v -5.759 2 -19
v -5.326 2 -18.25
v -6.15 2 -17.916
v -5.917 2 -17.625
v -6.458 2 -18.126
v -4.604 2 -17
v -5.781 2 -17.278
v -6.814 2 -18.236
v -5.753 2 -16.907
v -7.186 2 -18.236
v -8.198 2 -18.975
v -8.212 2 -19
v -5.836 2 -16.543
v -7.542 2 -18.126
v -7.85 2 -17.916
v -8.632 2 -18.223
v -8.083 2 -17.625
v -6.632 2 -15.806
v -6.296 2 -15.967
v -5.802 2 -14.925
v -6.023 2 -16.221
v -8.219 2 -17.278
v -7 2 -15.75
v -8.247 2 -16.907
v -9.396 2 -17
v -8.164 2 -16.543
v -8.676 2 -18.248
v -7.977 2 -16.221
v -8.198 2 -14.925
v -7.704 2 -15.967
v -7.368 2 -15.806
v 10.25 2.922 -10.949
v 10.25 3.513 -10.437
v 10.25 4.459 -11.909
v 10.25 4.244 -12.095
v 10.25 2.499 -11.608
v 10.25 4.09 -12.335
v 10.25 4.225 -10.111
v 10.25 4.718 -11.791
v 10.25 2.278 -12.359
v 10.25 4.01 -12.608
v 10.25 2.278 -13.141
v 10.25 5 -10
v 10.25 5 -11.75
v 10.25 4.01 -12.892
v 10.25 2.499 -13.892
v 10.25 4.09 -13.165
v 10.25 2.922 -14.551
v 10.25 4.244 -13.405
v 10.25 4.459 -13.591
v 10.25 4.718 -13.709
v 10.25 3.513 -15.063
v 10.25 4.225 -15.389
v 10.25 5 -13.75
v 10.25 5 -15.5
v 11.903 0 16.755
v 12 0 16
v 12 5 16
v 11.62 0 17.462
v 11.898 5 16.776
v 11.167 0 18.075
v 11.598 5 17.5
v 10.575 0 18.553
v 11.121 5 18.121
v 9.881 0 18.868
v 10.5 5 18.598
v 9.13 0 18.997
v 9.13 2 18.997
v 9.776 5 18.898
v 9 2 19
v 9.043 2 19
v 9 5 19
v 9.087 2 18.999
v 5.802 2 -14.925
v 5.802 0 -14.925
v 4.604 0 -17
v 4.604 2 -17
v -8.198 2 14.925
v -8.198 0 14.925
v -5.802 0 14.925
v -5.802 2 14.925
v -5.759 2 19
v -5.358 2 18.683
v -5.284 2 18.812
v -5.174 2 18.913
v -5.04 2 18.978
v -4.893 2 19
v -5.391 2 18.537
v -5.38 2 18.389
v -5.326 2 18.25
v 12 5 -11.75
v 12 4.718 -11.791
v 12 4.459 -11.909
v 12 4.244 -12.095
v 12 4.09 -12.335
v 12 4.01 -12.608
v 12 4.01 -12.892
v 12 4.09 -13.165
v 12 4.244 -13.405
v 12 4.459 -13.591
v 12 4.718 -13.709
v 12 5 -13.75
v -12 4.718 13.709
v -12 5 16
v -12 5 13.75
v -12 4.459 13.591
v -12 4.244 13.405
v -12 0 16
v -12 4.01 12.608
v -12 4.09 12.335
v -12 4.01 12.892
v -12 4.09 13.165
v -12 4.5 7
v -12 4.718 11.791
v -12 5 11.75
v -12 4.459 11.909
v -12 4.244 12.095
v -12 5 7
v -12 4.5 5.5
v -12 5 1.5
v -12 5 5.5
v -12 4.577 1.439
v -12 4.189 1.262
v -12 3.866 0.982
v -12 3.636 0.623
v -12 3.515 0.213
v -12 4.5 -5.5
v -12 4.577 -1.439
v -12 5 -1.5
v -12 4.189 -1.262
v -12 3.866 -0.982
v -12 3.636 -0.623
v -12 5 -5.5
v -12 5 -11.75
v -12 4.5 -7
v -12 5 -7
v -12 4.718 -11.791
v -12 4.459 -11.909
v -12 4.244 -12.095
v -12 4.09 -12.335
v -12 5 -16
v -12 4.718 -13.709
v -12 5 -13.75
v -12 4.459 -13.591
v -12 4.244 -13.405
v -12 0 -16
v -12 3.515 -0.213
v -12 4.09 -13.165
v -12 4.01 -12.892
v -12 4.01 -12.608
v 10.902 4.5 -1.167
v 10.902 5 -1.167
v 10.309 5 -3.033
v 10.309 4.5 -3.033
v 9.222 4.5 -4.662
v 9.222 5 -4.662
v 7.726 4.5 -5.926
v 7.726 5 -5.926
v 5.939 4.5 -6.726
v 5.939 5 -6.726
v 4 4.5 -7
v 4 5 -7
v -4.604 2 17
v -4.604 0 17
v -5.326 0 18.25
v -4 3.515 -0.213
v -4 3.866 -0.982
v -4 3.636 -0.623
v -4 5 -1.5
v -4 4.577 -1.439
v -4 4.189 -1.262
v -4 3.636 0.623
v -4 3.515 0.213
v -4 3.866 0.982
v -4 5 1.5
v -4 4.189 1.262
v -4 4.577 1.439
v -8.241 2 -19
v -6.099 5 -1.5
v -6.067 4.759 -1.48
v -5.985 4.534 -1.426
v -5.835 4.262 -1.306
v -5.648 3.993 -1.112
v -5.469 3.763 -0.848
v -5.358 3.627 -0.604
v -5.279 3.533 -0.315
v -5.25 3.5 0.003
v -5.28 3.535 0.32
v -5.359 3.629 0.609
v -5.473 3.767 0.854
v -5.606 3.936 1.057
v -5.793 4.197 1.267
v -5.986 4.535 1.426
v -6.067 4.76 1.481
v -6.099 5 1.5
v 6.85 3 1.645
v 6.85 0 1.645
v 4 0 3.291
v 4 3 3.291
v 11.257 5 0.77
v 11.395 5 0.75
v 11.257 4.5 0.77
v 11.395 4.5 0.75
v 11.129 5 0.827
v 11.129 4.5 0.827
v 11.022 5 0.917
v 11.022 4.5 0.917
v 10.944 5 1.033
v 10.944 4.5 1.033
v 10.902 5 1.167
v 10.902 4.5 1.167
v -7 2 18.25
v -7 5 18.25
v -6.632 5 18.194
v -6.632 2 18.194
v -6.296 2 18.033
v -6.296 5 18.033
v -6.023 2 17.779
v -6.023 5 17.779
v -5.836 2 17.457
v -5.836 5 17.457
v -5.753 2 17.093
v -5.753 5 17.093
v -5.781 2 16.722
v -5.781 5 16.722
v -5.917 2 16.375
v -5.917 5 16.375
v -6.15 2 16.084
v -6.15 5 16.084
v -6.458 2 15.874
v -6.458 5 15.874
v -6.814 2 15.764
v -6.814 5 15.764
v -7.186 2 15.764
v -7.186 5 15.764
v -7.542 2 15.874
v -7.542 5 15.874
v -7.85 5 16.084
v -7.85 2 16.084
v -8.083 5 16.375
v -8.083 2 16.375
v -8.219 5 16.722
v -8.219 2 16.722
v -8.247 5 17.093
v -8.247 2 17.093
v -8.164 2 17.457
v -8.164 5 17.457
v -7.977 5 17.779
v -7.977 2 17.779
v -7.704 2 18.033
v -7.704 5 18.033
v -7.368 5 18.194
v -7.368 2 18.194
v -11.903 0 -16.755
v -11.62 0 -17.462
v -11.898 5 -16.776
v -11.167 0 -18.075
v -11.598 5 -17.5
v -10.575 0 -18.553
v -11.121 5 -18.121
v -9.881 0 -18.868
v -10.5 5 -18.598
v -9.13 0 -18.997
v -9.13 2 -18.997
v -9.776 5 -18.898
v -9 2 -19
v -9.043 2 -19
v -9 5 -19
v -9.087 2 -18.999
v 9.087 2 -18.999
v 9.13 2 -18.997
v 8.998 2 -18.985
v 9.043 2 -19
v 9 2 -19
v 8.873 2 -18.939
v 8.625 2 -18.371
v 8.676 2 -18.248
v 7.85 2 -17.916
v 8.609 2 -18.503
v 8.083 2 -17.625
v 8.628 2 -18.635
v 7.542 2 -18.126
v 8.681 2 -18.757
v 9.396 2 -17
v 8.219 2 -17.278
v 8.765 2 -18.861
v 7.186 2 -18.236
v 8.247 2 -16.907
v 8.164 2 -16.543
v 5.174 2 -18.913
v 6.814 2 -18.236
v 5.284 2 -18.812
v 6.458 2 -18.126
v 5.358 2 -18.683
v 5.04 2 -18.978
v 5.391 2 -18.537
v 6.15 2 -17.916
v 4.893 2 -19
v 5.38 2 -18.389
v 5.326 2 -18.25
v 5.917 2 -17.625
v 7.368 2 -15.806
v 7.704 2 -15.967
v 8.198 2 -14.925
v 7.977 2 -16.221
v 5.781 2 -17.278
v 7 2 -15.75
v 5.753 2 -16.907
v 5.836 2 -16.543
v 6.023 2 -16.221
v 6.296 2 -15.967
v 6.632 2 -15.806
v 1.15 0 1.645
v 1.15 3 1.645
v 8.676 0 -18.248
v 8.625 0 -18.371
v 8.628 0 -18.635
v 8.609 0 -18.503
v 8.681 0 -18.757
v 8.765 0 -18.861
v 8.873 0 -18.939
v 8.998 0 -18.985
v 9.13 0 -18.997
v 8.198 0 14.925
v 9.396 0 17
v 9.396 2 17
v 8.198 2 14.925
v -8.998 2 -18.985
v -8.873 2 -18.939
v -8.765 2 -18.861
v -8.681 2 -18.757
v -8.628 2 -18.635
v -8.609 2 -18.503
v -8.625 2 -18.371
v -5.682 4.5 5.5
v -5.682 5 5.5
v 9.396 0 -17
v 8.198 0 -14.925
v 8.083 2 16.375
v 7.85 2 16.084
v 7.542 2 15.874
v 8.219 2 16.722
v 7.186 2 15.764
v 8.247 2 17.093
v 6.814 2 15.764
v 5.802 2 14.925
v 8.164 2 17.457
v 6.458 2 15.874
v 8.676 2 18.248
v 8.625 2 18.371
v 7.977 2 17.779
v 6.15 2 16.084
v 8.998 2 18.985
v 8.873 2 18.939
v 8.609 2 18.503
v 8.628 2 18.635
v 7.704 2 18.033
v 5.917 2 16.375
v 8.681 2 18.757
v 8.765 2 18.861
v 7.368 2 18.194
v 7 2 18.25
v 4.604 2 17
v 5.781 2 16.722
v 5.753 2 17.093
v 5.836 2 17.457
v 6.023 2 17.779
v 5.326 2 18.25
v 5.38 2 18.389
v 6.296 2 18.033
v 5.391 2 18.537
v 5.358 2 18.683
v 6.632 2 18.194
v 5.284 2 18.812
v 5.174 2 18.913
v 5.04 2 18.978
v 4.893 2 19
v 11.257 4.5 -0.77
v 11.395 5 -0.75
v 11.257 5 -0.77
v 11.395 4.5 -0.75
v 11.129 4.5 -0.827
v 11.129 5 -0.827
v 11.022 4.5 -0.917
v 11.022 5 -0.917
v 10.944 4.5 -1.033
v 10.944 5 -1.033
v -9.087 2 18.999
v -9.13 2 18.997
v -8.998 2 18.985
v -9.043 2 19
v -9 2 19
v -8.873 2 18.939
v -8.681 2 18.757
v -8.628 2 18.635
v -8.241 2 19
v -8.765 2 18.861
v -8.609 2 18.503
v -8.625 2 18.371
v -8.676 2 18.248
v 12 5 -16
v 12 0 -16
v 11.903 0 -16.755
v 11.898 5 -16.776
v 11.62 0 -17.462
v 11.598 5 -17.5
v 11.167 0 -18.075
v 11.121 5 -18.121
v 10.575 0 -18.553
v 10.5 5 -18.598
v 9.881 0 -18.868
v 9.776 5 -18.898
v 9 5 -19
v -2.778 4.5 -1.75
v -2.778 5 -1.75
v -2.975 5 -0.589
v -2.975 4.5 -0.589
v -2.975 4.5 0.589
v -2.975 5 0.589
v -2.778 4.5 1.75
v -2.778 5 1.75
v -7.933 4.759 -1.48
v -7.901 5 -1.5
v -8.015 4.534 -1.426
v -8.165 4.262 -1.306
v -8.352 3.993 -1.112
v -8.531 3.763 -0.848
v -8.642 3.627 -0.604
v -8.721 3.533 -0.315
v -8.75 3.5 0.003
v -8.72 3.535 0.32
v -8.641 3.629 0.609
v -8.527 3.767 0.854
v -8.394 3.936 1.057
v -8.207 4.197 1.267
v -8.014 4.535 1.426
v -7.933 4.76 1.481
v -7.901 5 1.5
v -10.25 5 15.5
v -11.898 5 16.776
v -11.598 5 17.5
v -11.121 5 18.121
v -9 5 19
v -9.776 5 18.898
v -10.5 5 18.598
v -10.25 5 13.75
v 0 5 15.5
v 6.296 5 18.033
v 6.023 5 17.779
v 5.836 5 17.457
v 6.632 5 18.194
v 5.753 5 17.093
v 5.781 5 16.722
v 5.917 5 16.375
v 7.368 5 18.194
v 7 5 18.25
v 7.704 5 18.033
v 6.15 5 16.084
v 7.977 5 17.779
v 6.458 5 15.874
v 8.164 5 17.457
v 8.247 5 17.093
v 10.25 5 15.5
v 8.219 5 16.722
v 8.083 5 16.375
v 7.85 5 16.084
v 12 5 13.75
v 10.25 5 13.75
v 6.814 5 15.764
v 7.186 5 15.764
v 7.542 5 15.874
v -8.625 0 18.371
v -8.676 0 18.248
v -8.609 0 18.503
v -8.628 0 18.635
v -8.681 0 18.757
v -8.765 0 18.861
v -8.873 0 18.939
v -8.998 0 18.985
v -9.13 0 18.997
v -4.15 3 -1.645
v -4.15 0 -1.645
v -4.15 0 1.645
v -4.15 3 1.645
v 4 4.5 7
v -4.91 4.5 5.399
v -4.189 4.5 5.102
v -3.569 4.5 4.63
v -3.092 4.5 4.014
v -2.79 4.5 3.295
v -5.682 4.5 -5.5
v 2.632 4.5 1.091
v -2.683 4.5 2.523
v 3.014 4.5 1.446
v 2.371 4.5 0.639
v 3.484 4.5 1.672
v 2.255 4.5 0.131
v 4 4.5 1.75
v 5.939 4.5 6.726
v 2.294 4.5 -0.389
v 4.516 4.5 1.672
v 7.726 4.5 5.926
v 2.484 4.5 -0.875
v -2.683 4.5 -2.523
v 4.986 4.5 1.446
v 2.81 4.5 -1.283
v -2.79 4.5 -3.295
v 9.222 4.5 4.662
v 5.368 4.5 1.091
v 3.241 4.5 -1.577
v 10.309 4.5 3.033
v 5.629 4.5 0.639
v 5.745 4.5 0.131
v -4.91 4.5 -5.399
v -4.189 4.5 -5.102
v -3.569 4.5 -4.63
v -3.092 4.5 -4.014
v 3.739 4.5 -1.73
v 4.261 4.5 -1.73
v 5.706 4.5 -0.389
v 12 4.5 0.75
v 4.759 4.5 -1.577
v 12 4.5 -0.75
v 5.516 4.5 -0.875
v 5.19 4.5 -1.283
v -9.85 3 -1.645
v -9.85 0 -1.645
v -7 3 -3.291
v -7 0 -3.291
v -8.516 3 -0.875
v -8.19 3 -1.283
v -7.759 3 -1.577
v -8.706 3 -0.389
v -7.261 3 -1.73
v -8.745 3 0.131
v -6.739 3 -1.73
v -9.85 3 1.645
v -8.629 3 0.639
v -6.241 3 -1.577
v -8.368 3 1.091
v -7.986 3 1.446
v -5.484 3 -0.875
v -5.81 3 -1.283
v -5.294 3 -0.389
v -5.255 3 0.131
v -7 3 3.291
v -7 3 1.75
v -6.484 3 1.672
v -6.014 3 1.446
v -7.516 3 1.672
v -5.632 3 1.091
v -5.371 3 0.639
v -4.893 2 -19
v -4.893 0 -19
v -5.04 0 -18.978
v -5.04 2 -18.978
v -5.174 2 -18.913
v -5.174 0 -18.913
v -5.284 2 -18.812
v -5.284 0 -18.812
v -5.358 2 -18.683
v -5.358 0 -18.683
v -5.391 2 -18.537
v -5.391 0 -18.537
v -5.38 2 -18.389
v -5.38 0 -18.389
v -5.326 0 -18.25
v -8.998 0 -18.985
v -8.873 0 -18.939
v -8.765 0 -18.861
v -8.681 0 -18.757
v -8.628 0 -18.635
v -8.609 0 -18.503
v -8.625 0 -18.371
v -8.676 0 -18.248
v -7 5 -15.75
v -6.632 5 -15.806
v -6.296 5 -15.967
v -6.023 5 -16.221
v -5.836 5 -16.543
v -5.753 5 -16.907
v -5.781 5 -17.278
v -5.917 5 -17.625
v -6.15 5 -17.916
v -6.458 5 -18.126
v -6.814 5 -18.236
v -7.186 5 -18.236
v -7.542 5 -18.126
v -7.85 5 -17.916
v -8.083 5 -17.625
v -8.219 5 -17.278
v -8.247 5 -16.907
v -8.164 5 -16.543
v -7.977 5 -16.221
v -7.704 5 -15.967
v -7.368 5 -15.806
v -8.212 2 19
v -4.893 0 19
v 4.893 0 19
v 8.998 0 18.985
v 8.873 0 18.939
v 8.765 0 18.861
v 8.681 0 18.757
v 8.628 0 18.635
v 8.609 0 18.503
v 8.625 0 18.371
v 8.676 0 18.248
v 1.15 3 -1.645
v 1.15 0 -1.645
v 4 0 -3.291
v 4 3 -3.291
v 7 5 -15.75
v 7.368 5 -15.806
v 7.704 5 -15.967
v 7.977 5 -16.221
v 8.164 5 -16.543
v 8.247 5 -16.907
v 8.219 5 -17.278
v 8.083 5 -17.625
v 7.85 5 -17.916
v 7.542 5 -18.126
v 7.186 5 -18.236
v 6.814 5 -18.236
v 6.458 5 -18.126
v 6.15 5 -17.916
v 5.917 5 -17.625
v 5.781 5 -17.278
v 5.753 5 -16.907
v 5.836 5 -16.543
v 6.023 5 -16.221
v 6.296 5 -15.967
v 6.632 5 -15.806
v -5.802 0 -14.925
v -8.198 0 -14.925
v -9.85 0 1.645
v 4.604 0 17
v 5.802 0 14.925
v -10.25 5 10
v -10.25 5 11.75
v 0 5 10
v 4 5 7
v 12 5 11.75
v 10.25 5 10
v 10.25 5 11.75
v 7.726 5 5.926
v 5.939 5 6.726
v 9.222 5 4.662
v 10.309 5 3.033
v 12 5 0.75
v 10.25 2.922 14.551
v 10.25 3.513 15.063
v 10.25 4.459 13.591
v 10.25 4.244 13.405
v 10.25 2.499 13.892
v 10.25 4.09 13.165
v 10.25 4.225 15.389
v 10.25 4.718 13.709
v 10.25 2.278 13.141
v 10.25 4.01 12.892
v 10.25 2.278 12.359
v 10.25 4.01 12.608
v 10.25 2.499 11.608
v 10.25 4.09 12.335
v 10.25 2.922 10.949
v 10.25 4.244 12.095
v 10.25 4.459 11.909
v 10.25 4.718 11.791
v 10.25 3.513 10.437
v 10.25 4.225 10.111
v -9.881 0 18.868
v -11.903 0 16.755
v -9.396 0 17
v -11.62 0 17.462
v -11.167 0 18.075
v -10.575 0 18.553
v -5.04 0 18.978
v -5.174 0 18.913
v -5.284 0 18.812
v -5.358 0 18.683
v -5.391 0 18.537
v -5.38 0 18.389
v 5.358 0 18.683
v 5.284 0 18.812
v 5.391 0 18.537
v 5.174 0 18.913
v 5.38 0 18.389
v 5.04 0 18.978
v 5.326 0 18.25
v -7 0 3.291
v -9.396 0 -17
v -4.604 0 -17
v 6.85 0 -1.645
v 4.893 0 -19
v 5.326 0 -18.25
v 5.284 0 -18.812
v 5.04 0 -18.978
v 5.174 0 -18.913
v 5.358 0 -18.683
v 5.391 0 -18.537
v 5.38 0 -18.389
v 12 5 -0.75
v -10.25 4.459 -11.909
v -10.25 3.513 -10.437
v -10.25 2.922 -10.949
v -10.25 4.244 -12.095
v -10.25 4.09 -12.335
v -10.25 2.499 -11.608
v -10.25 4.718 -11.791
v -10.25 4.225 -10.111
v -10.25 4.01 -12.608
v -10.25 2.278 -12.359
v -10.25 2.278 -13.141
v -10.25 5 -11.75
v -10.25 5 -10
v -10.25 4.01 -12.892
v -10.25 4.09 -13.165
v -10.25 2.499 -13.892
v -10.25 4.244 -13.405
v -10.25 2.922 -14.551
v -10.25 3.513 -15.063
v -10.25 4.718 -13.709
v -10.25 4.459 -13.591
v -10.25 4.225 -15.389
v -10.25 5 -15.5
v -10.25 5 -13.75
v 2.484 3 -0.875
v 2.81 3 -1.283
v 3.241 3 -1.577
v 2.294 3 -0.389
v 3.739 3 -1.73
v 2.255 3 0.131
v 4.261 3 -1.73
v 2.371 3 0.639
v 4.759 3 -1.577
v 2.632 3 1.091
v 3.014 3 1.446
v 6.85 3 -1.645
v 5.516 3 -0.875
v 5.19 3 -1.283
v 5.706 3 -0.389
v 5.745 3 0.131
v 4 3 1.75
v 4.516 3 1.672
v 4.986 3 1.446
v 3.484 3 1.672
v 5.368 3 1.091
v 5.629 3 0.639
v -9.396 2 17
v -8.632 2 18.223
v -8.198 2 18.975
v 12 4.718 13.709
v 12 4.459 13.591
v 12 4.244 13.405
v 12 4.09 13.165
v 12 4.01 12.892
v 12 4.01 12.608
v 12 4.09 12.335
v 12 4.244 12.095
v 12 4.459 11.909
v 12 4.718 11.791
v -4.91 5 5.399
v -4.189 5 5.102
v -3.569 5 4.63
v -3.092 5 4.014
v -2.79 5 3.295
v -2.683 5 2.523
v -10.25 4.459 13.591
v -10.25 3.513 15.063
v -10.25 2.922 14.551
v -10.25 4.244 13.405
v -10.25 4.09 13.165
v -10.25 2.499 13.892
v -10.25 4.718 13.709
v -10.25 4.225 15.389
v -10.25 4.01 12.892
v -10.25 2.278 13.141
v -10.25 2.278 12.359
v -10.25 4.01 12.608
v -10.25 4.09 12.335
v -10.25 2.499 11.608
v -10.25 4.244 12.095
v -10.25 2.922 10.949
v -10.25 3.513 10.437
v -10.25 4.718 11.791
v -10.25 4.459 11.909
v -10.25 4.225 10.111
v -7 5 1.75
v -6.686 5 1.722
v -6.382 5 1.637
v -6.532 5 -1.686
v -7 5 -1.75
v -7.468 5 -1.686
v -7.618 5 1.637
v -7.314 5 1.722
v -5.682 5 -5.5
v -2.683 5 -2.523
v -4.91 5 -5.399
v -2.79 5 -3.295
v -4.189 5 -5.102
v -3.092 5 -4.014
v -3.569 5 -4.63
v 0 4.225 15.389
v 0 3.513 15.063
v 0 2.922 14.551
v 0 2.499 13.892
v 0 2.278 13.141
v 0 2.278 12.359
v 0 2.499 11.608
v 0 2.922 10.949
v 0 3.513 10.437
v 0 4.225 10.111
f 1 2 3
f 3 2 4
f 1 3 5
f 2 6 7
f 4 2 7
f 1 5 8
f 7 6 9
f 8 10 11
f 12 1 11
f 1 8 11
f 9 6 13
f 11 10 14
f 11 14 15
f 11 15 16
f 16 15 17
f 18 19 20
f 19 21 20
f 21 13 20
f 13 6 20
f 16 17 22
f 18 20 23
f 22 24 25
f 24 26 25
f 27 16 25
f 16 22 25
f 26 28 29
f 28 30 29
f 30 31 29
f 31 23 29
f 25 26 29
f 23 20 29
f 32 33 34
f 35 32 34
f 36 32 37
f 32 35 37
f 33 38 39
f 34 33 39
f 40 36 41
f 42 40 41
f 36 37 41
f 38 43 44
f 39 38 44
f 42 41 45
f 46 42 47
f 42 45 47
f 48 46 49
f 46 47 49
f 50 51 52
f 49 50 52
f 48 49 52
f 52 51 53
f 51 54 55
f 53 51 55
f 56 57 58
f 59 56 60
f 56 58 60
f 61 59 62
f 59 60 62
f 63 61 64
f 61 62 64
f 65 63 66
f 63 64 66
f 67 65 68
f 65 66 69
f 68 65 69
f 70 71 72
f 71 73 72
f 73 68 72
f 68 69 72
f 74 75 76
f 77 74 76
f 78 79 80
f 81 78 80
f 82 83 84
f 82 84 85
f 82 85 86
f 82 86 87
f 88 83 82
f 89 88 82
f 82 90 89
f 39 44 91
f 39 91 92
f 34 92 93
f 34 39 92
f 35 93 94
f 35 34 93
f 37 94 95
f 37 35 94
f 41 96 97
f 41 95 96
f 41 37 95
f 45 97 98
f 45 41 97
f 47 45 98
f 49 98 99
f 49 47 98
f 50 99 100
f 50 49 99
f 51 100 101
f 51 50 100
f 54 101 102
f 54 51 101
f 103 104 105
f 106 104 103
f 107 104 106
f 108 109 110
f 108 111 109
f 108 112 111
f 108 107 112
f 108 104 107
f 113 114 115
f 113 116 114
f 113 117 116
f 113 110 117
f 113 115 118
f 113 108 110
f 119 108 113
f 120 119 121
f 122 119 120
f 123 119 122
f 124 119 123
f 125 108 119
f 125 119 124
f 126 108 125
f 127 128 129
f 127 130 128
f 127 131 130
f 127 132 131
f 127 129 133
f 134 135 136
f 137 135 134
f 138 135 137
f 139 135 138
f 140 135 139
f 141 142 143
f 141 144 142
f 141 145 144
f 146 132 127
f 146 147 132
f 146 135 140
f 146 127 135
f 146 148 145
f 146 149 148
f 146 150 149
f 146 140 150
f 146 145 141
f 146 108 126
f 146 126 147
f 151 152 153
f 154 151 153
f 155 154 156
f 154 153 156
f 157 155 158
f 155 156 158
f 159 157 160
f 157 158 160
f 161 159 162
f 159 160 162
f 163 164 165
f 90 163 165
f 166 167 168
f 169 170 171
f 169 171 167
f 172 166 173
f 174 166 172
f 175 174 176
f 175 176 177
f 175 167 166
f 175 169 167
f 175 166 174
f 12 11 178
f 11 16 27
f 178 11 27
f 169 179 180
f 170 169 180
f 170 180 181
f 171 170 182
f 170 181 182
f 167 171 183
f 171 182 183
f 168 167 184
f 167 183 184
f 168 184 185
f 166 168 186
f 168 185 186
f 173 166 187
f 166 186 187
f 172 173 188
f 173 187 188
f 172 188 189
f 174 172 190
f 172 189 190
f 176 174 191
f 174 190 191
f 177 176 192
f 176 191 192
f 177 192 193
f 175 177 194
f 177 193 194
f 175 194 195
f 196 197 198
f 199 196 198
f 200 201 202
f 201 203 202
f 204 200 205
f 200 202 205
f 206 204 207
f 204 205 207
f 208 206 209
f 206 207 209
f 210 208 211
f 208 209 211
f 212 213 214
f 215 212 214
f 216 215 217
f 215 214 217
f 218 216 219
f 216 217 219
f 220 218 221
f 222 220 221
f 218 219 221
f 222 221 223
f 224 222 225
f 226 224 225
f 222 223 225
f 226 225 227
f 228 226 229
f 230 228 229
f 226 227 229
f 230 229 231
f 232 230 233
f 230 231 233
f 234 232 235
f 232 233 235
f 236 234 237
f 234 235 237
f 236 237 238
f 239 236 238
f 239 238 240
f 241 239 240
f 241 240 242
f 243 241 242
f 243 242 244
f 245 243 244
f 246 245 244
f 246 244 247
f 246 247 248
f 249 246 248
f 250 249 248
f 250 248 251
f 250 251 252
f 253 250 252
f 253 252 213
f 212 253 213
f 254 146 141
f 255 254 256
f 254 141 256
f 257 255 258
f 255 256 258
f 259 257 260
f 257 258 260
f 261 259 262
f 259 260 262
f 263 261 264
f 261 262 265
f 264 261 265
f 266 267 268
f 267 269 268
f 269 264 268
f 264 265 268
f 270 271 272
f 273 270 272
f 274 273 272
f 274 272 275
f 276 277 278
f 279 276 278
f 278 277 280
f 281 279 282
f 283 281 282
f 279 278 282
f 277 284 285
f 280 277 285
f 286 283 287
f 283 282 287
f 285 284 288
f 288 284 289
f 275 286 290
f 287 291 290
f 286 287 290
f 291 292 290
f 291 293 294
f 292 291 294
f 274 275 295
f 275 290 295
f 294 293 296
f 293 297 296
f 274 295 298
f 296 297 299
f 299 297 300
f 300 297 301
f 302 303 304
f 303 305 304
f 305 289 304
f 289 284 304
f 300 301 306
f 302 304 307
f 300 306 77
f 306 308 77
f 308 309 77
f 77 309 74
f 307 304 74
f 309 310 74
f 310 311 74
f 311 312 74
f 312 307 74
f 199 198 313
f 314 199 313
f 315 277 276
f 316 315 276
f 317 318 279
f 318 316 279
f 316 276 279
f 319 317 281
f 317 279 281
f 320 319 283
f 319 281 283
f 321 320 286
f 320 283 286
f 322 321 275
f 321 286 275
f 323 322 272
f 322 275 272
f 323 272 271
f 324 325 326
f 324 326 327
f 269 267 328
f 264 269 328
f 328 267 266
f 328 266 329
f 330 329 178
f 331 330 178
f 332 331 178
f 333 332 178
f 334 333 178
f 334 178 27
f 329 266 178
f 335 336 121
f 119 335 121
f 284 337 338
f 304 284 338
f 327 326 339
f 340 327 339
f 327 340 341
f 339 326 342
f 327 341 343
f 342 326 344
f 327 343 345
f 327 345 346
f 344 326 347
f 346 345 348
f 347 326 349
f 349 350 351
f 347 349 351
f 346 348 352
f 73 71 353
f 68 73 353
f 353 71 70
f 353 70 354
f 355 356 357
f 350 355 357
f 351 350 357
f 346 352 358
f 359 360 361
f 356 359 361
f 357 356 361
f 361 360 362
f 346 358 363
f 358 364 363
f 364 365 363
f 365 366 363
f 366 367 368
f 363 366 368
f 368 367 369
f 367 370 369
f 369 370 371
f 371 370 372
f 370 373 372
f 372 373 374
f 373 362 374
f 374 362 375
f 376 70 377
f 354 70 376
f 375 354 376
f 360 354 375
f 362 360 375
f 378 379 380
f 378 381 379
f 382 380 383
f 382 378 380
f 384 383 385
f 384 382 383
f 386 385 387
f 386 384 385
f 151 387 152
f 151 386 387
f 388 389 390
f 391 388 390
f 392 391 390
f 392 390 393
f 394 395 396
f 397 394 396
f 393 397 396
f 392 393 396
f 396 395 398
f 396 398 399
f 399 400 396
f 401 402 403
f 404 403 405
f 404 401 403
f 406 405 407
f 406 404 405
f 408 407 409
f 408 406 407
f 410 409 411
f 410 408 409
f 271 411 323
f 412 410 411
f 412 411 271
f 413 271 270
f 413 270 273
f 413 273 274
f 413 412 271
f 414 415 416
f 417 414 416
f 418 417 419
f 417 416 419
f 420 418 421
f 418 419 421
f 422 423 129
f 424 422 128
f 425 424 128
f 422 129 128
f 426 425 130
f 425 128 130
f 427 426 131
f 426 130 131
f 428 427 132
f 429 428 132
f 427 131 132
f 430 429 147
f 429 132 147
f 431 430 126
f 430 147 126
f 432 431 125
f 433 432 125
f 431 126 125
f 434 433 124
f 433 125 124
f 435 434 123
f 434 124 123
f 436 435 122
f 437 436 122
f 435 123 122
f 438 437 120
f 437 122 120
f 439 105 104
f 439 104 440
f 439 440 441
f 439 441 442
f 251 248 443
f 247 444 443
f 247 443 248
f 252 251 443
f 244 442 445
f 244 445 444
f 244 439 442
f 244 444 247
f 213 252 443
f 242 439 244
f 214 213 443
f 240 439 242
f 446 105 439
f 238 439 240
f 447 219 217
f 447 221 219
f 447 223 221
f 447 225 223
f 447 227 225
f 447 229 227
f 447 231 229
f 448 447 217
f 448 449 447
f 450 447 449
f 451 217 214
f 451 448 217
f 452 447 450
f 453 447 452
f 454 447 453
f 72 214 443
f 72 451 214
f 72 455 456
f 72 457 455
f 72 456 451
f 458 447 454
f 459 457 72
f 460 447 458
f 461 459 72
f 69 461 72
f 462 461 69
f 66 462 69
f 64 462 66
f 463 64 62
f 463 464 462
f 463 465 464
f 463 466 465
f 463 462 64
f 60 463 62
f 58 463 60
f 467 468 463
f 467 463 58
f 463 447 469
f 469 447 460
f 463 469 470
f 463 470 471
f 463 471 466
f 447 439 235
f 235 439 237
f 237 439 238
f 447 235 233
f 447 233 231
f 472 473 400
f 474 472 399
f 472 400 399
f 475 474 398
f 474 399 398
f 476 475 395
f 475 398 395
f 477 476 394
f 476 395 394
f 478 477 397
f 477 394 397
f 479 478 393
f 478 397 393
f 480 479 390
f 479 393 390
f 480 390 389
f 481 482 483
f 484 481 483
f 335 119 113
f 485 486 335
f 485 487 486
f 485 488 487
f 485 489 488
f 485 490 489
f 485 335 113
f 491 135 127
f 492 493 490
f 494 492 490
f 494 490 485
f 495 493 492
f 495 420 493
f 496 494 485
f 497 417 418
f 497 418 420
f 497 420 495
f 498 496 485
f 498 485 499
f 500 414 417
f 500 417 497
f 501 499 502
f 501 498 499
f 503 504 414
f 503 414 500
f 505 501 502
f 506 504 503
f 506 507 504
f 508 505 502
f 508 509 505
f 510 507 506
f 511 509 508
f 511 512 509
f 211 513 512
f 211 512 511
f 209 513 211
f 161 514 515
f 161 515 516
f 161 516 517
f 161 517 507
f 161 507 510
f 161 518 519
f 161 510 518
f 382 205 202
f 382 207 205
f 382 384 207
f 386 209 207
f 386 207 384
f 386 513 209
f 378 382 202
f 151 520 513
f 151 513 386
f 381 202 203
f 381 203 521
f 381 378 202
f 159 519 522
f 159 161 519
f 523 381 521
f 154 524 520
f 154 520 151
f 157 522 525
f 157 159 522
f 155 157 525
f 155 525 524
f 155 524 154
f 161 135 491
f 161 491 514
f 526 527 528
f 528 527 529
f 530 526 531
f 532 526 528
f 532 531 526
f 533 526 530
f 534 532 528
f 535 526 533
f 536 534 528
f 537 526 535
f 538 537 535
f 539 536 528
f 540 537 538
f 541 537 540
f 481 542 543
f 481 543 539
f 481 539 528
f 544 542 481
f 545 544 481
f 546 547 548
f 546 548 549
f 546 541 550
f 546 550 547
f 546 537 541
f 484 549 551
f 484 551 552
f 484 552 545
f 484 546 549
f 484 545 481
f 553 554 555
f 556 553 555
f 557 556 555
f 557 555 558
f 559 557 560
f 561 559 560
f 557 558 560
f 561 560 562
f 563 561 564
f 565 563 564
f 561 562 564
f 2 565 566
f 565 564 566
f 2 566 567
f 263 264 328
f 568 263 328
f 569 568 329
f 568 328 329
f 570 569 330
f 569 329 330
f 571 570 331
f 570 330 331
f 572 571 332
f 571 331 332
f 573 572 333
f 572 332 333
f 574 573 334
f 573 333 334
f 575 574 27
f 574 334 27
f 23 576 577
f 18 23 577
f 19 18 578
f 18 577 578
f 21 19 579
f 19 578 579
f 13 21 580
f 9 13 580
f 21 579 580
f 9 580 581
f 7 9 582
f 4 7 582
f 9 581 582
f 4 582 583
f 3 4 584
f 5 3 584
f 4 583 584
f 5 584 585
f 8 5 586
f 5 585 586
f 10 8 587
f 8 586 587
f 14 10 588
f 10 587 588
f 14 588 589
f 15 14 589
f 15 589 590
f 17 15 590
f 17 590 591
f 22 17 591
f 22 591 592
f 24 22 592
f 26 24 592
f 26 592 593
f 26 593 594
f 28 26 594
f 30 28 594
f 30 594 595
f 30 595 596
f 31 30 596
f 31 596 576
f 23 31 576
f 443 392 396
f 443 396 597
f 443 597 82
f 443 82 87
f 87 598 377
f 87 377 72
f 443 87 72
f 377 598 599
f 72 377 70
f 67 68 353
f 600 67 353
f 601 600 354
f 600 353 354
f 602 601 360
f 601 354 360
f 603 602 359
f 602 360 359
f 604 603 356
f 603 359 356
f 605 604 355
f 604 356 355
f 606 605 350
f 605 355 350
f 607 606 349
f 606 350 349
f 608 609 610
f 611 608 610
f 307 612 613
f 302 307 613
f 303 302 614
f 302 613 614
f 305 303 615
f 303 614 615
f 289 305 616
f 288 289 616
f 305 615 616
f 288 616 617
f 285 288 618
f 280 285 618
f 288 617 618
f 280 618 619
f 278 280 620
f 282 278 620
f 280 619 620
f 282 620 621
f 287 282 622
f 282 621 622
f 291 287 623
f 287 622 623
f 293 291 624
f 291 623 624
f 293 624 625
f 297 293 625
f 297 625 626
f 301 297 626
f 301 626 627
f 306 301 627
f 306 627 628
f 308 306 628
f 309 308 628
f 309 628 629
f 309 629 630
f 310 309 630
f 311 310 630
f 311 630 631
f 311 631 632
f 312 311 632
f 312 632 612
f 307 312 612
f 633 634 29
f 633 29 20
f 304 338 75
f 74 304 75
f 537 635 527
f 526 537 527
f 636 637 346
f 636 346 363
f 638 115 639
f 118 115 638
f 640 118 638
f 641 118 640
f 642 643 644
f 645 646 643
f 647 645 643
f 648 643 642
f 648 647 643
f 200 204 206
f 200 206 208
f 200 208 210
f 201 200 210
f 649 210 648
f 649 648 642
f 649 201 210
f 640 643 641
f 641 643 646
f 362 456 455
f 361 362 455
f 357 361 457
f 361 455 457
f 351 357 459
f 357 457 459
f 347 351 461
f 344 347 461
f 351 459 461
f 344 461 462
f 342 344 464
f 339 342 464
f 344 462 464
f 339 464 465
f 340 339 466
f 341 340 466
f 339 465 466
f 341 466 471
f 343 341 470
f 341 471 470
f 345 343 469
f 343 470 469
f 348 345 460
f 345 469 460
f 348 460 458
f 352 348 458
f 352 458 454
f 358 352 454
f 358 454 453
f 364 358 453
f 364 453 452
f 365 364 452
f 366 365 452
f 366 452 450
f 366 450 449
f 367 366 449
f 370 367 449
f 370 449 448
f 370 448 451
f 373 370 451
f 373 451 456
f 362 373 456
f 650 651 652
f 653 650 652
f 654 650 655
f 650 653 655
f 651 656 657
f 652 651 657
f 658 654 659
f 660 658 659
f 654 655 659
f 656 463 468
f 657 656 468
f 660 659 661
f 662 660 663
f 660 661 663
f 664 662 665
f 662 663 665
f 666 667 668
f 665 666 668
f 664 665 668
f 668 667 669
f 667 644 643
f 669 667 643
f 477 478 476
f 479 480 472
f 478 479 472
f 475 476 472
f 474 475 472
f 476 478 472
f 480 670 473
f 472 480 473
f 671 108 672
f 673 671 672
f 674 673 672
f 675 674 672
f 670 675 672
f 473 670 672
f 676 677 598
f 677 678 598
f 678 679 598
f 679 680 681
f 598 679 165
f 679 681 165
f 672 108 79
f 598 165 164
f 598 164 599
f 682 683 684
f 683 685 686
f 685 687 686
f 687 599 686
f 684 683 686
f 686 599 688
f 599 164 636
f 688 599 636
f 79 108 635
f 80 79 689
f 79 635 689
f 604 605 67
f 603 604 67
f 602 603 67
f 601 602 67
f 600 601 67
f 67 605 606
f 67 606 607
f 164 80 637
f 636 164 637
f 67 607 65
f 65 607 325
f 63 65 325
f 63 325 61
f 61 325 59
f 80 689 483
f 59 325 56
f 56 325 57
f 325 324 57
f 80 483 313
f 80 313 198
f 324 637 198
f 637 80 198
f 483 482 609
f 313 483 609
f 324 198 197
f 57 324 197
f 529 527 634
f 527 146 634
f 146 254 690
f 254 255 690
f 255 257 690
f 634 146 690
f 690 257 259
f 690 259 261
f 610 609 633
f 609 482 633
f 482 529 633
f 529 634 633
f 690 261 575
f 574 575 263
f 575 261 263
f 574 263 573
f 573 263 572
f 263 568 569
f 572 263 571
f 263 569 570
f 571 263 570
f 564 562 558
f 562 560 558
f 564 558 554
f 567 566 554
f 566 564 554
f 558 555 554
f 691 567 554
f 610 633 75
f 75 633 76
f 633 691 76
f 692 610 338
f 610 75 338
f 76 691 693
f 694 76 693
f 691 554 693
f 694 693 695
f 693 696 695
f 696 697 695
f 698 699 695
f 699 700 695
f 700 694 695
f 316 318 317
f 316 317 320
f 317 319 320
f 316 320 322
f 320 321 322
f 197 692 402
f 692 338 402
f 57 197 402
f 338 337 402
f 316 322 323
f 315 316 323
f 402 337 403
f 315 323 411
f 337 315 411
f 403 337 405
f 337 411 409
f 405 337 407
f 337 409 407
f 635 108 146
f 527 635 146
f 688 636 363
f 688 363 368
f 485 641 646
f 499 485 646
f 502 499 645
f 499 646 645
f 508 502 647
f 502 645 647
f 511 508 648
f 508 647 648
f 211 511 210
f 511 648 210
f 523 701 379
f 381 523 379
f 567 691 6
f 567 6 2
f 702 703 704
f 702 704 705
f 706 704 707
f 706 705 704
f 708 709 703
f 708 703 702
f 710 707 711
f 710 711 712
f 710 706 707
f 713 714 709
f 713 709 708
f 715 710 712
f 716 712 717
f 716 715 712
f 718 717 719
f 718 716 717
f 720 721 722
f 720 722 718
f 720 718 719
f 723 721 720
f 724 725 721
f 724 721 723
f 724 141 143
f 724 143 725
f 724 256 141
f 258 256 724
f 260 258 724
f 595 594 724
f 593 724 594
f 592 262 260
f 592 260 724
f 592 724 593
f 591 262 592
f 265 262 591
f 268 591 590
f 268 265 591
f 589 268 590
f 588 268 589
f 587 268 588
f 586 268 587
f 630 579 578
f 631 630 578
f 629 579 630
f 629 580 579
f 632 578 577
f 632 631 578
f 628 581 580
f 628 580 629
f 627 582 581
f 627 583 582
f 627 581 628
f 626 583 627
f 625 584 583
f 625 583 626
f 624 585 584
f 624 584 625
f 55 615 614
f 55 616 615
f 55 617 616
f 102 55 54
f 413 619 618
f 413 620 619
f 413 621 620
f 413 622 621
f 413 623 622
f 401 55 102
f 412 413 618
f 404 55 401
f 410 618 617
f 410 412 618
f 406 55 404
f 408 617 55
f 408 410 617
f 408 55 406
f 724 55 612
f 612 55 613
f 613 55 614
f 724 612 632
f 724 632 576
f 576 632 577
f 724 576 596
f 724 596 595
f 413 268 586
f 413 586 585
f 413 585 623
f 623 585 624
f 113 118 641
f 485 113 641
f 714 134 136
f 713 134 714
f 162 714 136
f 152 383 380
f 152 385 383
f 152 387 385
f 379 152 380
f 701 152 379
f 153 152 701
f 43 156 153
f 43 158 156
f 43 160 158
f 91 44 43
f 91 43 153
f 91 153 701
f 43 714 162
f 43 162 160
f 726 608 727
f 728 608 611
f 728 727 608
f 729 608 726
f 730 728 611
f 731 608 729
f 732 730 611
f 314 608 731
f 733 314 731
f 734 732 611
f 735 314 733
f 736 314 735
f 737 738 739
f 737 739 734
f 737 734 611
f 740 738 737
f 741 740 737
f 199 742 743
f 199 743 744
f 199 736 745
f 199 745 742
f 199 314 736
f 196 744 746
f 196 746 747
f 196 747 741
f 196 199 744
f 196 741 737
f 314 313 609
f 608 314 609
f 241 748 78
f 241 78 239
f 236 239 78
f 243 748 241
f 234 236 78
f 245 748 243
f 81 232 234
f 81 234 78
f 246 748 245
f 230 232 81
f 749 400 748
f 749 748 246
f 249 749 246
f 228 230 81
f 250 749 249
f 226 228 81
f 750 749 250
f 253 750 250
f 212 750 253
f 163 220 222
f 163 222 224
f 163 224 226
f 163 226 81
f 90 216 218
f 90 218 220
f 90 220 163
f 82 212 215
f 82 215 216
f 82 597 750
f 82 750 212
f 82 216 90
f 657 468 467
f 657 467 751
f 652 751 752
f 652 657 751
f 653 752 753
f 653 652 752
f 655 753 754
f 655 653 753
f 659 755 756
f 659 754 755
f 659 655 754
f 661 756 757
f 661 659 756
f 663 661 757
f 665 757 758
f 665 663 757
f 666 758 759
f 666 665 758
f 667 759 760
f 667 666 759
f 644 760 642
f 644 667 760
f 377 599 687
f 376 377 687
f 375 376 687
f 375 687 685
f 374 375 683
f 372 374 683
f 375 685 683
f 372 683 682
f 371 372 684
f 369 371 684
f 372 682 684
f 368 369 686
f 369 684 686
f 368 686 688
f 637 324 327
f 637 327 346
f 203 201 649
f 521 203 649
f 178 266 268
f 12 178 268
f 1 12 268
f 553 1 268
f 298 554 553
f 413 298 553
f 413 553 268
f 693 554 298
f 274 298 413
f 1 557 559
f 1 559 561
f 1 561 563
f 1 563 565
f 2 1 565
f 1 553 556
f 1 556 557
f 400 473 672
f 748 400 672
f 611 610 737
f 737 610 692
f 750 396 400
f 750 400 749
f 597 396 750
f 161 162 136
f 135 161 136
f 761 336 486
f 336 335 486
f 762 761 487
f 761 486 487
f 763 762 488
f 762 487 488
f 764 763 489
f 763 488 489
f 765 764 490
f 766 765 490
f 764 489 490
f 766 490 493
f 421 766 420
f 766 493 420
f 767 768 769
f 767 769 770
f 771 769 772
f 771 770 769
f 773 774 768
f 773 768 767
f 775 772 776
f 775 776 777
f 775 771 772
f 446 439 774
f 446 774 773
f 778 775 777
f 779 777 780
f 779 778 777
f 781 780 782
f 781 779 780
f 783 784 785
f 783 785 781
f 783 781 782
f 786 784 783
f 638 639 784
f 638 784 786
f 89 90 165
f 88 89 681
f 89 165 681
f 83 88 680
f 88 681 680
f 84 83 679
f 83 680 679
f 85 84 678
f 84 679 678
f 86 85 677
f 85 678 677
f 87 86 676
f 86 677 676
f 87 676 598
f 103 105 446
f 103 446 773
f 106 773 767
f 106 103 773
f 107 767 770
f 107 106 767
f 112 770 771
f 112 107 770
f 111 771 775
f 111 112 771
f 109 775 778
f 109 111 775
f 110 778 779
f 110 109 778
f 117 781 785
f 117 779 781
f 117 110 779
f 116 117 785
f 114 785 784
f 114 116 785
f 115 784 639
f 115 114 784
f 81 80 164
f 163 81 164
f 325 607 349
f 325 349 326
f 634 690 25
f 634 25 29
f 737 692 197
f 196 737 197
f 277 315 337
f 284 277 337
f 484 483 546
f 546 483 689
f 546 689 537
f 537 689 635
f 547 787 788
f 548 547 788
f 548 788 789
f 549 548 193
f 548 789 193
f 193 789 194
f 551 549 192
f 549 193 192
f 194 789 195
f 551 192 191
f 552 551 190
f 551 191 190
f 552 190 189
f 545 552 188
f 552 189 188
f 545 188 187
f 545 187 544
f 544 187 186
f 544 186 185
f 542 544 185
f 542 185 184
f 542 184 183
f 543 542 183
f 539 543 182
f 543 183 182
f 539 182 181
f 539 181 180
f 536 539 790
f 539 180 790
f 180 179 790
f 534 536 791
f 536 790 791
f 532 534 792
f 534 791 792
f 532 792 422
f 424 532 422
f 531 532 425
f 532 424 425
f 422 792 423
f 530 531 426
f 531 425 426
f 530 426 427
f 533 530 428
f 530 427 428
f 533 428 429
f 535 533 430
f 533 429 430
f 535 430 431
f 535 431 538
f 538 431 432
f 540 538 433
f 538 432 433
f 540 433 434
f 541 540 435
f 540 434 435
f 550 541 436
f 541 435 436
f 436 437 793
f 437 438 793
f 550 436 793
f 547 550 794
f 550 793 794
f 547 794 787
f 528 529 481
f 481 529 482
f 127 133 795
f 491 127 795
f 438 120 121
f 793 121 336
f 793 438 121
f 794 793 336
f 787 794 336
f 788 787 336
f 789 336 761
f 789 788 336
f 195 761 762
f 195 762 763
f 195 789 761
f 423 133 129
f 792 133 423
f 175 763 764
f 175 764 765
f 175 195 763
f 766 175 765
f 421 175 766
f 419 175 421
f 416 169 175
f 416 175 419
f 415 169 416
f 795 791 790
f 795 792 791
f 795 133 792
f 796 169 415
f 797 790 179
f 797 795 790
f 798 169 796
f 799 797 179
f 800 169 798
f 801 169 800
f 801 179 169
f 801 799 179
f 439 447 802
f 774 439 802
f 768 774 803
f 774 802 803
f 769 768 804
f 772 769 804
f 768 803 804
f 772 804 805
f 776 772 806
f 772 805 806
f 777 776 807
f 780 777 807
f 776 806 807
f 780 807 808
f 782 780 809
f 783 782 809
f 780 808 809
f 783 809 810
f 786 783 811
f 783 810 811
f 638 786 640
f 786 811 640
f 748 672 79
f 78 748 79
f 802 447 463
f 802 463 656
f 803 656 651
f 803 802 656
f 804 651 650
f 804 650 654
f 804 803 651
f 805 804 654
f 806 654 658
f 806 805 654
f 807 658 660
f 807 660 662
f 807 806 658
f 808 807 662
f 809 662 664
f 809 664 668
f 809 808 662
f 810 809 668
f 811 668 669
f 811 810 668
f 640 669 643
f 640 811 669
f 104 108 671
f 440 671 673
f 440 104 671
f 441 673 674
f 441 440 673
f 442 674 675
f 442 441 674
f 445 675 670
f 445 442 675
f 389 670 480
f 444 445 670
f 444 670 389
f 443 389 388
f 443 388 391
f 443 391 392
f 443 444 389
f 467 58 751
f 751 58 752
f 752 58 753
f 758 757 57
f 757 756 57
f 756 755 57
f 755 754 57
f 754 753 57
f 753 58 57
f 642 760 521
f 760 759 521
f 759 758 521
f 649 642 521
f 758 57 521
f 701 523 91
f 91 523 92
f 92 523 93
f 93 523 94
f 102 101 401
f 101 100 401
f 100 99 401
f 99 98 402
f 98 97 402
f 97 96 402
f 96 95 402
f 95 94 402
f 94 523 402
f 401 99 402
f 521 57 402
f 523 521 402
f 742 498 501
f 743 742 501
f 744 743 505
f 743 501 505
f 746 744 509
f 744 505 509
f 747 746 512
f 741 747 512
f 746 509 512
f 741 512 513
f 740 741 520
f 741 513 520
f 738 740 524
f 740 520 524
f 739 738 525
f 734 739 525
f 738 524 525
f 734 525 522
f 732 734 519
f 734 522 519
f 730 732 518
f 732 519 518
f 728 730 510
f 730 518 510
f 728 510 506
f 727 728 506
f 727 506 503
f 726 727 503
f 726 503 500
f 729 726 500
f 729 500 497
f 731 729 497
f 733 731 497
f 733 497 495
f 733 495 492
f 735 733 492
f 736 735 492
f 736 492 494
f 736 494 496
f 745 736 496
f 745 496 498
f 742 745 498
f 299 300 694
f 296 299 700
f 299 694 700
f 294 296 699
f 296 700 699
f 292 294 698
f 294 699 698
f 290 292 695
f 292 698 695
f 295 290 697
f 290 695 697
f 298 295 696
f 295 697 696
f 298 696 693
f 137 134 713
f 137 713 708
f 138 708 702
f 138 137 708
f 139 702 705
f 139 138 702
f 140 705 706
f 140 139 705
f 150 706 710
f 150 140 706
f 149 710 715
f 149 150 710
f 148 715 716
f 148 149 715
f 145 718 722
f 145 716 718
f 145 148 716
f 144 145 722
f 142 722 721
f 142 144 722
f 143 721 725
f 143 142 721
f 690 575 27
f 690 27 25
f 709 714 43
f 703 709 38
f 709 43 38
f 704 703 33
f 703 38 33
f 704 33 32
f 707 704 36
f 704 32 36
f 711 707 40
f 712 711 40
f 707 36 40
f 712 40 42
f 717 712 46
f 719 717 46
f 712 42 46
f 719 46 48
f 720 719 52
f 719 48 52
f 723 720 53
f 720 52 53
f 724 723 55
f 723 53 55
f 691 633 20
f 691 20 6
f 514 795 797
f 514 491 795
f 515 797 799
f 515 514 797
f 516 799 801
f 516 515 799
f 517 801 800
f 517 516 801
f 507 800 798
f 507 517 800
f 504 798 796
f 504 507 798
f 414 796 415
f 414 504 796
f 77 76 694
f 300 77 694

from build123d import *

# Parameters (mm, degrees)
SKETCH_1_W               = 24
SKETCH_1_H               = 38
EXTRUDE_1_DEPTH          = 5
SKETCH_2_R               = 2.75
CUT_EXTRUDE_1_DEPTH      = 10.25
CUT_EXTRUDE_2_DEPTH      = 24.021728866
CUT_EXTRUDE_2_DEPTH_BACK = 24.021728866
SKETCH_3_R               = 1
CUT_EXTRUDE_3_DEPTH      = 0.5
SKETCH_5_R               = 1.75
CUT_EXTRUDE_4_DEPTH      = 24.021728866
FILLET_1_R               = 3
FILLET_2_R               = 3
SKETCH_6_R               = 1.5
CUT_EXTRUDE_5_DEPTH      = 8
FILLET_3_R               = 0.5
SKETCH_7_R               = 1.25
CUT_EXTRUDE_6_DEPTH      = 24.02172894
CUT_EXTRUDE_9_DEPTH      = 3
CUT_EXTRUDE_10_DEPTH     = 2
FILLET_4_R               = 0.5


with BuildPart() as part:
    # Эскиз1 → Бобышка-Вытянуть1 (new body)
    with BuildSketch(Plane(origin=(0, 0, 0), x_dir=(1, 0, 0), z_dir=(0, 1, 0))):
        Rectangle(SKETCH_1_W, SKETCH_1_H)
    extrude(amount=EXTRUDE_1_DEPTH)

    # Эскиз2 → Вырез-Вытянуть1 (cut, symmetric)
    with BuildSketch(Plane(origin=(0, 0, 0), x_dir=(0, 0, -1), z_dir=(1, 0, 0))):
        with Locations((-12.75, 5)):
            Circle(SKETCH_2_R)
        with Locations((12.75, 5)):
            Circle(SKETCH_2_R)
    extrude(amount=CUT_EXTRUDE_1_DEPTH, both=True, mode=Mode.SUBTRACT)

    # Эскиз3 → Вырез-Вытянуть2 (cut, two sides: drawn at the far end of the back side and taken through both)
    with BuildSketch(Plane(origin=(0, 0, 0), x_dir=(0, 0, -1), z_dir=(1, 0, 0)).offset(-CUT_EXTRUDE_2_DEPTH_BACK)):
        with Locations((-12.75, 5)):
            Circle(SKETCH_3_R)
        with Locations((12.75, 5)):
            Circle(SKETCH_3_R)
    extrude(amount=CUT_EXTRUDE_2_DEPTH + CUT_EXTRUDE_2_DEPTH_BACK, mode=Mode.SUBTRACT)

    # Эскиз4 → Вырез-Вытянуть3 (cut)
    with BuildSketch(Plane(origin=(0, 5, 0), x_dir=(1, 0, 0), z_dir=(0, 1, 0))):
        with BuildLine():
            Line((4, 7), (-12, 7))
            Line((-12, 7), (-12, 5.5))
            Line((-12, 5.5), (-0.330127019, 5.5))
            ThreePointArc((-0.330127019, 5.5), (-3, 0), (-0.330127019, -5.5))
            Line((-0.330127019, -5.5), (-12, -5.5))
            Line((-12, -5.5), (-12, -7))
            Line((-12, -7), (4, -7))
            ThreePointArc((4, -7), (8.677071733, -5.208166664), (10.959705454, -0.75))
            Line((10.959705454, -0.75), (12, -0.75))
            Line((12, -0.75), (12, 0.75))
            Line((12, 0.75), (10.959705454, 0.75))
            ThreePointArc((10.959705454, 0.75), (8.677071733, 5.208166664), (4, 7))
        make_face()
    extrude(amount=-CUT_EXTRUDE_3_DEPTH, mode=Mode.SUBTRACT)

    # Эскиз5 → Вырез-Вытянуть4 (cut, through all)
    with BuildSketch(Plane(origin=(0, 5, 0), x_dir=(1, 0, 0), z_dir=(0, 1, 0))):
        with Locations(Location((4, 0, 0), (0, 0, 270))):
            Circle(SKETCH_5_R)
        with Locations(Location((-7, 0, 0), (0, 0, 270))):
            Circle(SKETCH_5_R)
    extrude(amount=-CUT_EXTRUDE_4_DEPTH, mode=Mode.SUBTRACT)

    # Скругление1
    fillet_1_edges = [part.edges().sort_by_distance(p)[0] for p in [
        (-0.330127019, 4.75, 5.5),
        (-0.330127019, 4.75, -5.5),
    ]]
    fillet(fillet_1_edges, radius=FILLET_1_R)

    # Скругление2
    fillet_2_edges = [part.edges().sort_by_distance(p)[0] for p in [
        (12, 2.5, 19),
        (-12, 2.5, 19),
        (-12, 2.5, -19),
        (12, 2.5, -19),
    ]]
    fillet(fillet_2_edges, radius=FILLET_2_R)

    # Эскиз6 → Вырез-Вытянуть5 (cut)
    with BuildSketch(Plane.ZY.offset(12)):
        with Locations((0, 5)):
            Circle(SKETCH_6_R)
    extrude(amount=-CUT_EXTRUDE_5_DEPTH, mode=Mode.SUBTRACT)

    # Скругление3
    fillet_3_edges = [part.edges().sort_by_distance(p)[0] for p in [
        (10.959705454, 4.75, -0.75),
        (10.959705454, 4.75, 0.75),
    ]]
    fillet(fillet_3_edges, radius=FILLET_3_R)

    # Эскиз7 → Вырез-Вытянуть6 (cut, through all)
    with BuildSketch(Plane(origin=(0, 5, 0), x_dir=(1, 0, 0), z_dir=(0, 1, 0))):
        with Locations(Location((-7, 17, 0), (0, 0, 270))):
            Circle(SKETCH_7_R)
        with Locations(Location((7, 17, 0), (0, 0, 270))):
            Circle(SKETCH_7_R)
        with Locations(Location((7, -17, 0), (0, 0, 270))):
            Circle(SKETCH_7_R)
        with Locations(Location((-7, -17, 0), (0, 0, 270))):
            Circle(SKETCH_7_R)
    extrude(amount=-CUT_EXTRUDE_6_DEPTH, mode=Mode.SUBTRACT)

    # Эскиз9 → Вырез-Вытянуть9 (cut)
    with BuildSketch(Plane.XZ):
        Polygon((-7, 3.290896534), (-9.85, 1.645448267), (-9.85, -1.645448267), (-7, -3.290896534), (-4.15, -1.645448267), (-4.15, 1.645448267), align=None)
        Polygon((6.85, -1.645448267), (6.85, 1.645448267), (4, 3.290896534), (1.15, 1.645448267), (1.15, -1.645448267), (4, -3.290896534), align=None)
    extrude(amount=-CUT_EXTRUDE_9_DEPTH, mode=Mode.SUBTRACT)

    # Эскиз10 → Вырез-Вытянуть10 (cut)
    with BuildSketch(Plane.XZ):
        Polygon((8.198001809, 14.925), (5.801998191, 14.925), (4.603996383, 17), (5.801998191, 19.075), (8.198001809, 19.075), (9.396003617, 17), align=None)
        Polygon((-5.801998191, 14.925), (-4.603996383, 17), (-5.801998191, 19.075), (-8.198001809, 19.075), (-9.396003617, 17), (-8.198001809, 14.925), align=None)
        Polygon((9.396003617, -17), (8.198001809, -14.925), (5.801998191, -14.925), (4.603996383, -17), (5.801998191, -19.075), (8.198001809, -19.075), align=None)
        Polygon((-8.198001809, -14.925), (-5.801998191, -14.925), (-4.603996383, -17), (-5.801998191, -19.075), (-8.198001809, -19.075), (-9.396003617, -17), align=None)
    extrude(amount=-CUT_EXTRUDE_10_DEPTH, mode=Mode.SUBTRACT)

    # Скругление4
    # the kernel refuses this fillet: 0.5 mm, written as the material it takes off along each edge
    with BuildSketch(Plane(origin=(-8.241303079, 2, 19), x_dir=(-0.9999949104209014, 0, -0.003190475245701581), z_dir=(0, -1, 0)), Plane(origin=(8.241303079, 2, -19), x_dir=(0.9999949104209014, 0, 0.003190475245705545), z_dir=(0, -1, 0))) as fillet_4_piece_1:
        with BuildLine():
            CenterArc((0.868988605, 0.499594021), FILLET_4_R, 149.817198924, 122.491852834)
            Line((0.436775726, 0.750974265), (0.393554438, 0.77611229))
            Line((0.393554438, 0.77611229), (-0.043221288, 0.025138024))
            Line((-0.043221288, 0.025138024), (-0.000159524, -0.049999746))
            ThreePointArc((-0.000159524, -0.049999746), (0.758533536, -0.052420349), (0.891147911, -0.049959402))
            Line((0.891147911, -0.049959402), (0.889133429, 0))
        make_face()
    extrude(amount=4.222833572, mode=Mode.SUBTRACT)
    with BuildSketch(Plane(origin=(-5.758696921, -2.165063509, 19), x_dir=(1, 0, 0), z_dir=(0, 1, 0)), Plane(origin=(5.758696921, -2.165063509, -19), x_dir=(-1, 0, 0), z_dir=(0, 1, 0))) as fillet_4_piece_2:
        with BuildLine():
            CenterArc((FILLET_4_R * 1.73205080757, FILLET_4_R), FILLET_4_R, 150, 120)
            Line((FILLET_4_R * 0.866025403784, FILLET_4_R * 1.5), (0, 0))
            Line((0, 0), (FILLET_4_R * 1.73205080757, 0))
        make_face()
    extrude(amount=4.165063509, mode=Mode.SUBTRACT)
    with BuildSketch(Plane(origin=(-5.758696921, -2.165063509, -19), x_dir=(1, 0, 0), z_dir=(0, 1, 0)), Plane(origin=(5.758696921, -2.165063509, 19), x_dir=(-1, 0, 0), z_dir=(0, 1, 0))) as fillet_4_piece_3:
        with BuildLine():
            CenterArc((FILLET_4_R * 1.73205080757, -FILLET_4_R), FILLET_4_R, 90, 120)
            Line((FILLET_4_R * 0.866025403784, -FILLET_4_R * 1.5), (0, 0))
            Line((0, 0), (FILLET_4_R * 1.73205080757, 0))
        make_face()
    extrude(amount=4.165063509, mode=Mode.SUBTRACT)
    with BuildSketch(Plane(origin=(-8.241303079, 2, -19), x_dir=(-0.9999949104209014, 0, 0.0031904752457015684), z_dir=(0, -1, 0)), Plane(origin=(8.241303079, 2, 19), x_dir=(0.9999949104209014, 0, -0.003190475245701575), z_dir=(0, -1, 0))) as fillet_4_piece_4:
        with BuildLine():
            CenterArc((0.868988605, -0.499594021), FILLET_4_R, 87.690948243, 122.491852834)
            Line((0.436775726, -0.750974265), (0.393554438, -0.77611229))
            Line((0.393554438, -0.77611229), (-0.043221288, -0.025138024))
            Line((-0.043221288, -0.025138024), (-0.000159524, 0.049999746))
            ThreePointArc((-0.000159524, 0.049999746), (0.758533536, 0.052420349), (0.891147911, 0.049959402))
            Line((0.891147911, 0.049959402), (0.889133429, 0))
        make_face()
    extrude(amount=4.222833572, mode=Mode.SUBTRACT)


solid = part.part
